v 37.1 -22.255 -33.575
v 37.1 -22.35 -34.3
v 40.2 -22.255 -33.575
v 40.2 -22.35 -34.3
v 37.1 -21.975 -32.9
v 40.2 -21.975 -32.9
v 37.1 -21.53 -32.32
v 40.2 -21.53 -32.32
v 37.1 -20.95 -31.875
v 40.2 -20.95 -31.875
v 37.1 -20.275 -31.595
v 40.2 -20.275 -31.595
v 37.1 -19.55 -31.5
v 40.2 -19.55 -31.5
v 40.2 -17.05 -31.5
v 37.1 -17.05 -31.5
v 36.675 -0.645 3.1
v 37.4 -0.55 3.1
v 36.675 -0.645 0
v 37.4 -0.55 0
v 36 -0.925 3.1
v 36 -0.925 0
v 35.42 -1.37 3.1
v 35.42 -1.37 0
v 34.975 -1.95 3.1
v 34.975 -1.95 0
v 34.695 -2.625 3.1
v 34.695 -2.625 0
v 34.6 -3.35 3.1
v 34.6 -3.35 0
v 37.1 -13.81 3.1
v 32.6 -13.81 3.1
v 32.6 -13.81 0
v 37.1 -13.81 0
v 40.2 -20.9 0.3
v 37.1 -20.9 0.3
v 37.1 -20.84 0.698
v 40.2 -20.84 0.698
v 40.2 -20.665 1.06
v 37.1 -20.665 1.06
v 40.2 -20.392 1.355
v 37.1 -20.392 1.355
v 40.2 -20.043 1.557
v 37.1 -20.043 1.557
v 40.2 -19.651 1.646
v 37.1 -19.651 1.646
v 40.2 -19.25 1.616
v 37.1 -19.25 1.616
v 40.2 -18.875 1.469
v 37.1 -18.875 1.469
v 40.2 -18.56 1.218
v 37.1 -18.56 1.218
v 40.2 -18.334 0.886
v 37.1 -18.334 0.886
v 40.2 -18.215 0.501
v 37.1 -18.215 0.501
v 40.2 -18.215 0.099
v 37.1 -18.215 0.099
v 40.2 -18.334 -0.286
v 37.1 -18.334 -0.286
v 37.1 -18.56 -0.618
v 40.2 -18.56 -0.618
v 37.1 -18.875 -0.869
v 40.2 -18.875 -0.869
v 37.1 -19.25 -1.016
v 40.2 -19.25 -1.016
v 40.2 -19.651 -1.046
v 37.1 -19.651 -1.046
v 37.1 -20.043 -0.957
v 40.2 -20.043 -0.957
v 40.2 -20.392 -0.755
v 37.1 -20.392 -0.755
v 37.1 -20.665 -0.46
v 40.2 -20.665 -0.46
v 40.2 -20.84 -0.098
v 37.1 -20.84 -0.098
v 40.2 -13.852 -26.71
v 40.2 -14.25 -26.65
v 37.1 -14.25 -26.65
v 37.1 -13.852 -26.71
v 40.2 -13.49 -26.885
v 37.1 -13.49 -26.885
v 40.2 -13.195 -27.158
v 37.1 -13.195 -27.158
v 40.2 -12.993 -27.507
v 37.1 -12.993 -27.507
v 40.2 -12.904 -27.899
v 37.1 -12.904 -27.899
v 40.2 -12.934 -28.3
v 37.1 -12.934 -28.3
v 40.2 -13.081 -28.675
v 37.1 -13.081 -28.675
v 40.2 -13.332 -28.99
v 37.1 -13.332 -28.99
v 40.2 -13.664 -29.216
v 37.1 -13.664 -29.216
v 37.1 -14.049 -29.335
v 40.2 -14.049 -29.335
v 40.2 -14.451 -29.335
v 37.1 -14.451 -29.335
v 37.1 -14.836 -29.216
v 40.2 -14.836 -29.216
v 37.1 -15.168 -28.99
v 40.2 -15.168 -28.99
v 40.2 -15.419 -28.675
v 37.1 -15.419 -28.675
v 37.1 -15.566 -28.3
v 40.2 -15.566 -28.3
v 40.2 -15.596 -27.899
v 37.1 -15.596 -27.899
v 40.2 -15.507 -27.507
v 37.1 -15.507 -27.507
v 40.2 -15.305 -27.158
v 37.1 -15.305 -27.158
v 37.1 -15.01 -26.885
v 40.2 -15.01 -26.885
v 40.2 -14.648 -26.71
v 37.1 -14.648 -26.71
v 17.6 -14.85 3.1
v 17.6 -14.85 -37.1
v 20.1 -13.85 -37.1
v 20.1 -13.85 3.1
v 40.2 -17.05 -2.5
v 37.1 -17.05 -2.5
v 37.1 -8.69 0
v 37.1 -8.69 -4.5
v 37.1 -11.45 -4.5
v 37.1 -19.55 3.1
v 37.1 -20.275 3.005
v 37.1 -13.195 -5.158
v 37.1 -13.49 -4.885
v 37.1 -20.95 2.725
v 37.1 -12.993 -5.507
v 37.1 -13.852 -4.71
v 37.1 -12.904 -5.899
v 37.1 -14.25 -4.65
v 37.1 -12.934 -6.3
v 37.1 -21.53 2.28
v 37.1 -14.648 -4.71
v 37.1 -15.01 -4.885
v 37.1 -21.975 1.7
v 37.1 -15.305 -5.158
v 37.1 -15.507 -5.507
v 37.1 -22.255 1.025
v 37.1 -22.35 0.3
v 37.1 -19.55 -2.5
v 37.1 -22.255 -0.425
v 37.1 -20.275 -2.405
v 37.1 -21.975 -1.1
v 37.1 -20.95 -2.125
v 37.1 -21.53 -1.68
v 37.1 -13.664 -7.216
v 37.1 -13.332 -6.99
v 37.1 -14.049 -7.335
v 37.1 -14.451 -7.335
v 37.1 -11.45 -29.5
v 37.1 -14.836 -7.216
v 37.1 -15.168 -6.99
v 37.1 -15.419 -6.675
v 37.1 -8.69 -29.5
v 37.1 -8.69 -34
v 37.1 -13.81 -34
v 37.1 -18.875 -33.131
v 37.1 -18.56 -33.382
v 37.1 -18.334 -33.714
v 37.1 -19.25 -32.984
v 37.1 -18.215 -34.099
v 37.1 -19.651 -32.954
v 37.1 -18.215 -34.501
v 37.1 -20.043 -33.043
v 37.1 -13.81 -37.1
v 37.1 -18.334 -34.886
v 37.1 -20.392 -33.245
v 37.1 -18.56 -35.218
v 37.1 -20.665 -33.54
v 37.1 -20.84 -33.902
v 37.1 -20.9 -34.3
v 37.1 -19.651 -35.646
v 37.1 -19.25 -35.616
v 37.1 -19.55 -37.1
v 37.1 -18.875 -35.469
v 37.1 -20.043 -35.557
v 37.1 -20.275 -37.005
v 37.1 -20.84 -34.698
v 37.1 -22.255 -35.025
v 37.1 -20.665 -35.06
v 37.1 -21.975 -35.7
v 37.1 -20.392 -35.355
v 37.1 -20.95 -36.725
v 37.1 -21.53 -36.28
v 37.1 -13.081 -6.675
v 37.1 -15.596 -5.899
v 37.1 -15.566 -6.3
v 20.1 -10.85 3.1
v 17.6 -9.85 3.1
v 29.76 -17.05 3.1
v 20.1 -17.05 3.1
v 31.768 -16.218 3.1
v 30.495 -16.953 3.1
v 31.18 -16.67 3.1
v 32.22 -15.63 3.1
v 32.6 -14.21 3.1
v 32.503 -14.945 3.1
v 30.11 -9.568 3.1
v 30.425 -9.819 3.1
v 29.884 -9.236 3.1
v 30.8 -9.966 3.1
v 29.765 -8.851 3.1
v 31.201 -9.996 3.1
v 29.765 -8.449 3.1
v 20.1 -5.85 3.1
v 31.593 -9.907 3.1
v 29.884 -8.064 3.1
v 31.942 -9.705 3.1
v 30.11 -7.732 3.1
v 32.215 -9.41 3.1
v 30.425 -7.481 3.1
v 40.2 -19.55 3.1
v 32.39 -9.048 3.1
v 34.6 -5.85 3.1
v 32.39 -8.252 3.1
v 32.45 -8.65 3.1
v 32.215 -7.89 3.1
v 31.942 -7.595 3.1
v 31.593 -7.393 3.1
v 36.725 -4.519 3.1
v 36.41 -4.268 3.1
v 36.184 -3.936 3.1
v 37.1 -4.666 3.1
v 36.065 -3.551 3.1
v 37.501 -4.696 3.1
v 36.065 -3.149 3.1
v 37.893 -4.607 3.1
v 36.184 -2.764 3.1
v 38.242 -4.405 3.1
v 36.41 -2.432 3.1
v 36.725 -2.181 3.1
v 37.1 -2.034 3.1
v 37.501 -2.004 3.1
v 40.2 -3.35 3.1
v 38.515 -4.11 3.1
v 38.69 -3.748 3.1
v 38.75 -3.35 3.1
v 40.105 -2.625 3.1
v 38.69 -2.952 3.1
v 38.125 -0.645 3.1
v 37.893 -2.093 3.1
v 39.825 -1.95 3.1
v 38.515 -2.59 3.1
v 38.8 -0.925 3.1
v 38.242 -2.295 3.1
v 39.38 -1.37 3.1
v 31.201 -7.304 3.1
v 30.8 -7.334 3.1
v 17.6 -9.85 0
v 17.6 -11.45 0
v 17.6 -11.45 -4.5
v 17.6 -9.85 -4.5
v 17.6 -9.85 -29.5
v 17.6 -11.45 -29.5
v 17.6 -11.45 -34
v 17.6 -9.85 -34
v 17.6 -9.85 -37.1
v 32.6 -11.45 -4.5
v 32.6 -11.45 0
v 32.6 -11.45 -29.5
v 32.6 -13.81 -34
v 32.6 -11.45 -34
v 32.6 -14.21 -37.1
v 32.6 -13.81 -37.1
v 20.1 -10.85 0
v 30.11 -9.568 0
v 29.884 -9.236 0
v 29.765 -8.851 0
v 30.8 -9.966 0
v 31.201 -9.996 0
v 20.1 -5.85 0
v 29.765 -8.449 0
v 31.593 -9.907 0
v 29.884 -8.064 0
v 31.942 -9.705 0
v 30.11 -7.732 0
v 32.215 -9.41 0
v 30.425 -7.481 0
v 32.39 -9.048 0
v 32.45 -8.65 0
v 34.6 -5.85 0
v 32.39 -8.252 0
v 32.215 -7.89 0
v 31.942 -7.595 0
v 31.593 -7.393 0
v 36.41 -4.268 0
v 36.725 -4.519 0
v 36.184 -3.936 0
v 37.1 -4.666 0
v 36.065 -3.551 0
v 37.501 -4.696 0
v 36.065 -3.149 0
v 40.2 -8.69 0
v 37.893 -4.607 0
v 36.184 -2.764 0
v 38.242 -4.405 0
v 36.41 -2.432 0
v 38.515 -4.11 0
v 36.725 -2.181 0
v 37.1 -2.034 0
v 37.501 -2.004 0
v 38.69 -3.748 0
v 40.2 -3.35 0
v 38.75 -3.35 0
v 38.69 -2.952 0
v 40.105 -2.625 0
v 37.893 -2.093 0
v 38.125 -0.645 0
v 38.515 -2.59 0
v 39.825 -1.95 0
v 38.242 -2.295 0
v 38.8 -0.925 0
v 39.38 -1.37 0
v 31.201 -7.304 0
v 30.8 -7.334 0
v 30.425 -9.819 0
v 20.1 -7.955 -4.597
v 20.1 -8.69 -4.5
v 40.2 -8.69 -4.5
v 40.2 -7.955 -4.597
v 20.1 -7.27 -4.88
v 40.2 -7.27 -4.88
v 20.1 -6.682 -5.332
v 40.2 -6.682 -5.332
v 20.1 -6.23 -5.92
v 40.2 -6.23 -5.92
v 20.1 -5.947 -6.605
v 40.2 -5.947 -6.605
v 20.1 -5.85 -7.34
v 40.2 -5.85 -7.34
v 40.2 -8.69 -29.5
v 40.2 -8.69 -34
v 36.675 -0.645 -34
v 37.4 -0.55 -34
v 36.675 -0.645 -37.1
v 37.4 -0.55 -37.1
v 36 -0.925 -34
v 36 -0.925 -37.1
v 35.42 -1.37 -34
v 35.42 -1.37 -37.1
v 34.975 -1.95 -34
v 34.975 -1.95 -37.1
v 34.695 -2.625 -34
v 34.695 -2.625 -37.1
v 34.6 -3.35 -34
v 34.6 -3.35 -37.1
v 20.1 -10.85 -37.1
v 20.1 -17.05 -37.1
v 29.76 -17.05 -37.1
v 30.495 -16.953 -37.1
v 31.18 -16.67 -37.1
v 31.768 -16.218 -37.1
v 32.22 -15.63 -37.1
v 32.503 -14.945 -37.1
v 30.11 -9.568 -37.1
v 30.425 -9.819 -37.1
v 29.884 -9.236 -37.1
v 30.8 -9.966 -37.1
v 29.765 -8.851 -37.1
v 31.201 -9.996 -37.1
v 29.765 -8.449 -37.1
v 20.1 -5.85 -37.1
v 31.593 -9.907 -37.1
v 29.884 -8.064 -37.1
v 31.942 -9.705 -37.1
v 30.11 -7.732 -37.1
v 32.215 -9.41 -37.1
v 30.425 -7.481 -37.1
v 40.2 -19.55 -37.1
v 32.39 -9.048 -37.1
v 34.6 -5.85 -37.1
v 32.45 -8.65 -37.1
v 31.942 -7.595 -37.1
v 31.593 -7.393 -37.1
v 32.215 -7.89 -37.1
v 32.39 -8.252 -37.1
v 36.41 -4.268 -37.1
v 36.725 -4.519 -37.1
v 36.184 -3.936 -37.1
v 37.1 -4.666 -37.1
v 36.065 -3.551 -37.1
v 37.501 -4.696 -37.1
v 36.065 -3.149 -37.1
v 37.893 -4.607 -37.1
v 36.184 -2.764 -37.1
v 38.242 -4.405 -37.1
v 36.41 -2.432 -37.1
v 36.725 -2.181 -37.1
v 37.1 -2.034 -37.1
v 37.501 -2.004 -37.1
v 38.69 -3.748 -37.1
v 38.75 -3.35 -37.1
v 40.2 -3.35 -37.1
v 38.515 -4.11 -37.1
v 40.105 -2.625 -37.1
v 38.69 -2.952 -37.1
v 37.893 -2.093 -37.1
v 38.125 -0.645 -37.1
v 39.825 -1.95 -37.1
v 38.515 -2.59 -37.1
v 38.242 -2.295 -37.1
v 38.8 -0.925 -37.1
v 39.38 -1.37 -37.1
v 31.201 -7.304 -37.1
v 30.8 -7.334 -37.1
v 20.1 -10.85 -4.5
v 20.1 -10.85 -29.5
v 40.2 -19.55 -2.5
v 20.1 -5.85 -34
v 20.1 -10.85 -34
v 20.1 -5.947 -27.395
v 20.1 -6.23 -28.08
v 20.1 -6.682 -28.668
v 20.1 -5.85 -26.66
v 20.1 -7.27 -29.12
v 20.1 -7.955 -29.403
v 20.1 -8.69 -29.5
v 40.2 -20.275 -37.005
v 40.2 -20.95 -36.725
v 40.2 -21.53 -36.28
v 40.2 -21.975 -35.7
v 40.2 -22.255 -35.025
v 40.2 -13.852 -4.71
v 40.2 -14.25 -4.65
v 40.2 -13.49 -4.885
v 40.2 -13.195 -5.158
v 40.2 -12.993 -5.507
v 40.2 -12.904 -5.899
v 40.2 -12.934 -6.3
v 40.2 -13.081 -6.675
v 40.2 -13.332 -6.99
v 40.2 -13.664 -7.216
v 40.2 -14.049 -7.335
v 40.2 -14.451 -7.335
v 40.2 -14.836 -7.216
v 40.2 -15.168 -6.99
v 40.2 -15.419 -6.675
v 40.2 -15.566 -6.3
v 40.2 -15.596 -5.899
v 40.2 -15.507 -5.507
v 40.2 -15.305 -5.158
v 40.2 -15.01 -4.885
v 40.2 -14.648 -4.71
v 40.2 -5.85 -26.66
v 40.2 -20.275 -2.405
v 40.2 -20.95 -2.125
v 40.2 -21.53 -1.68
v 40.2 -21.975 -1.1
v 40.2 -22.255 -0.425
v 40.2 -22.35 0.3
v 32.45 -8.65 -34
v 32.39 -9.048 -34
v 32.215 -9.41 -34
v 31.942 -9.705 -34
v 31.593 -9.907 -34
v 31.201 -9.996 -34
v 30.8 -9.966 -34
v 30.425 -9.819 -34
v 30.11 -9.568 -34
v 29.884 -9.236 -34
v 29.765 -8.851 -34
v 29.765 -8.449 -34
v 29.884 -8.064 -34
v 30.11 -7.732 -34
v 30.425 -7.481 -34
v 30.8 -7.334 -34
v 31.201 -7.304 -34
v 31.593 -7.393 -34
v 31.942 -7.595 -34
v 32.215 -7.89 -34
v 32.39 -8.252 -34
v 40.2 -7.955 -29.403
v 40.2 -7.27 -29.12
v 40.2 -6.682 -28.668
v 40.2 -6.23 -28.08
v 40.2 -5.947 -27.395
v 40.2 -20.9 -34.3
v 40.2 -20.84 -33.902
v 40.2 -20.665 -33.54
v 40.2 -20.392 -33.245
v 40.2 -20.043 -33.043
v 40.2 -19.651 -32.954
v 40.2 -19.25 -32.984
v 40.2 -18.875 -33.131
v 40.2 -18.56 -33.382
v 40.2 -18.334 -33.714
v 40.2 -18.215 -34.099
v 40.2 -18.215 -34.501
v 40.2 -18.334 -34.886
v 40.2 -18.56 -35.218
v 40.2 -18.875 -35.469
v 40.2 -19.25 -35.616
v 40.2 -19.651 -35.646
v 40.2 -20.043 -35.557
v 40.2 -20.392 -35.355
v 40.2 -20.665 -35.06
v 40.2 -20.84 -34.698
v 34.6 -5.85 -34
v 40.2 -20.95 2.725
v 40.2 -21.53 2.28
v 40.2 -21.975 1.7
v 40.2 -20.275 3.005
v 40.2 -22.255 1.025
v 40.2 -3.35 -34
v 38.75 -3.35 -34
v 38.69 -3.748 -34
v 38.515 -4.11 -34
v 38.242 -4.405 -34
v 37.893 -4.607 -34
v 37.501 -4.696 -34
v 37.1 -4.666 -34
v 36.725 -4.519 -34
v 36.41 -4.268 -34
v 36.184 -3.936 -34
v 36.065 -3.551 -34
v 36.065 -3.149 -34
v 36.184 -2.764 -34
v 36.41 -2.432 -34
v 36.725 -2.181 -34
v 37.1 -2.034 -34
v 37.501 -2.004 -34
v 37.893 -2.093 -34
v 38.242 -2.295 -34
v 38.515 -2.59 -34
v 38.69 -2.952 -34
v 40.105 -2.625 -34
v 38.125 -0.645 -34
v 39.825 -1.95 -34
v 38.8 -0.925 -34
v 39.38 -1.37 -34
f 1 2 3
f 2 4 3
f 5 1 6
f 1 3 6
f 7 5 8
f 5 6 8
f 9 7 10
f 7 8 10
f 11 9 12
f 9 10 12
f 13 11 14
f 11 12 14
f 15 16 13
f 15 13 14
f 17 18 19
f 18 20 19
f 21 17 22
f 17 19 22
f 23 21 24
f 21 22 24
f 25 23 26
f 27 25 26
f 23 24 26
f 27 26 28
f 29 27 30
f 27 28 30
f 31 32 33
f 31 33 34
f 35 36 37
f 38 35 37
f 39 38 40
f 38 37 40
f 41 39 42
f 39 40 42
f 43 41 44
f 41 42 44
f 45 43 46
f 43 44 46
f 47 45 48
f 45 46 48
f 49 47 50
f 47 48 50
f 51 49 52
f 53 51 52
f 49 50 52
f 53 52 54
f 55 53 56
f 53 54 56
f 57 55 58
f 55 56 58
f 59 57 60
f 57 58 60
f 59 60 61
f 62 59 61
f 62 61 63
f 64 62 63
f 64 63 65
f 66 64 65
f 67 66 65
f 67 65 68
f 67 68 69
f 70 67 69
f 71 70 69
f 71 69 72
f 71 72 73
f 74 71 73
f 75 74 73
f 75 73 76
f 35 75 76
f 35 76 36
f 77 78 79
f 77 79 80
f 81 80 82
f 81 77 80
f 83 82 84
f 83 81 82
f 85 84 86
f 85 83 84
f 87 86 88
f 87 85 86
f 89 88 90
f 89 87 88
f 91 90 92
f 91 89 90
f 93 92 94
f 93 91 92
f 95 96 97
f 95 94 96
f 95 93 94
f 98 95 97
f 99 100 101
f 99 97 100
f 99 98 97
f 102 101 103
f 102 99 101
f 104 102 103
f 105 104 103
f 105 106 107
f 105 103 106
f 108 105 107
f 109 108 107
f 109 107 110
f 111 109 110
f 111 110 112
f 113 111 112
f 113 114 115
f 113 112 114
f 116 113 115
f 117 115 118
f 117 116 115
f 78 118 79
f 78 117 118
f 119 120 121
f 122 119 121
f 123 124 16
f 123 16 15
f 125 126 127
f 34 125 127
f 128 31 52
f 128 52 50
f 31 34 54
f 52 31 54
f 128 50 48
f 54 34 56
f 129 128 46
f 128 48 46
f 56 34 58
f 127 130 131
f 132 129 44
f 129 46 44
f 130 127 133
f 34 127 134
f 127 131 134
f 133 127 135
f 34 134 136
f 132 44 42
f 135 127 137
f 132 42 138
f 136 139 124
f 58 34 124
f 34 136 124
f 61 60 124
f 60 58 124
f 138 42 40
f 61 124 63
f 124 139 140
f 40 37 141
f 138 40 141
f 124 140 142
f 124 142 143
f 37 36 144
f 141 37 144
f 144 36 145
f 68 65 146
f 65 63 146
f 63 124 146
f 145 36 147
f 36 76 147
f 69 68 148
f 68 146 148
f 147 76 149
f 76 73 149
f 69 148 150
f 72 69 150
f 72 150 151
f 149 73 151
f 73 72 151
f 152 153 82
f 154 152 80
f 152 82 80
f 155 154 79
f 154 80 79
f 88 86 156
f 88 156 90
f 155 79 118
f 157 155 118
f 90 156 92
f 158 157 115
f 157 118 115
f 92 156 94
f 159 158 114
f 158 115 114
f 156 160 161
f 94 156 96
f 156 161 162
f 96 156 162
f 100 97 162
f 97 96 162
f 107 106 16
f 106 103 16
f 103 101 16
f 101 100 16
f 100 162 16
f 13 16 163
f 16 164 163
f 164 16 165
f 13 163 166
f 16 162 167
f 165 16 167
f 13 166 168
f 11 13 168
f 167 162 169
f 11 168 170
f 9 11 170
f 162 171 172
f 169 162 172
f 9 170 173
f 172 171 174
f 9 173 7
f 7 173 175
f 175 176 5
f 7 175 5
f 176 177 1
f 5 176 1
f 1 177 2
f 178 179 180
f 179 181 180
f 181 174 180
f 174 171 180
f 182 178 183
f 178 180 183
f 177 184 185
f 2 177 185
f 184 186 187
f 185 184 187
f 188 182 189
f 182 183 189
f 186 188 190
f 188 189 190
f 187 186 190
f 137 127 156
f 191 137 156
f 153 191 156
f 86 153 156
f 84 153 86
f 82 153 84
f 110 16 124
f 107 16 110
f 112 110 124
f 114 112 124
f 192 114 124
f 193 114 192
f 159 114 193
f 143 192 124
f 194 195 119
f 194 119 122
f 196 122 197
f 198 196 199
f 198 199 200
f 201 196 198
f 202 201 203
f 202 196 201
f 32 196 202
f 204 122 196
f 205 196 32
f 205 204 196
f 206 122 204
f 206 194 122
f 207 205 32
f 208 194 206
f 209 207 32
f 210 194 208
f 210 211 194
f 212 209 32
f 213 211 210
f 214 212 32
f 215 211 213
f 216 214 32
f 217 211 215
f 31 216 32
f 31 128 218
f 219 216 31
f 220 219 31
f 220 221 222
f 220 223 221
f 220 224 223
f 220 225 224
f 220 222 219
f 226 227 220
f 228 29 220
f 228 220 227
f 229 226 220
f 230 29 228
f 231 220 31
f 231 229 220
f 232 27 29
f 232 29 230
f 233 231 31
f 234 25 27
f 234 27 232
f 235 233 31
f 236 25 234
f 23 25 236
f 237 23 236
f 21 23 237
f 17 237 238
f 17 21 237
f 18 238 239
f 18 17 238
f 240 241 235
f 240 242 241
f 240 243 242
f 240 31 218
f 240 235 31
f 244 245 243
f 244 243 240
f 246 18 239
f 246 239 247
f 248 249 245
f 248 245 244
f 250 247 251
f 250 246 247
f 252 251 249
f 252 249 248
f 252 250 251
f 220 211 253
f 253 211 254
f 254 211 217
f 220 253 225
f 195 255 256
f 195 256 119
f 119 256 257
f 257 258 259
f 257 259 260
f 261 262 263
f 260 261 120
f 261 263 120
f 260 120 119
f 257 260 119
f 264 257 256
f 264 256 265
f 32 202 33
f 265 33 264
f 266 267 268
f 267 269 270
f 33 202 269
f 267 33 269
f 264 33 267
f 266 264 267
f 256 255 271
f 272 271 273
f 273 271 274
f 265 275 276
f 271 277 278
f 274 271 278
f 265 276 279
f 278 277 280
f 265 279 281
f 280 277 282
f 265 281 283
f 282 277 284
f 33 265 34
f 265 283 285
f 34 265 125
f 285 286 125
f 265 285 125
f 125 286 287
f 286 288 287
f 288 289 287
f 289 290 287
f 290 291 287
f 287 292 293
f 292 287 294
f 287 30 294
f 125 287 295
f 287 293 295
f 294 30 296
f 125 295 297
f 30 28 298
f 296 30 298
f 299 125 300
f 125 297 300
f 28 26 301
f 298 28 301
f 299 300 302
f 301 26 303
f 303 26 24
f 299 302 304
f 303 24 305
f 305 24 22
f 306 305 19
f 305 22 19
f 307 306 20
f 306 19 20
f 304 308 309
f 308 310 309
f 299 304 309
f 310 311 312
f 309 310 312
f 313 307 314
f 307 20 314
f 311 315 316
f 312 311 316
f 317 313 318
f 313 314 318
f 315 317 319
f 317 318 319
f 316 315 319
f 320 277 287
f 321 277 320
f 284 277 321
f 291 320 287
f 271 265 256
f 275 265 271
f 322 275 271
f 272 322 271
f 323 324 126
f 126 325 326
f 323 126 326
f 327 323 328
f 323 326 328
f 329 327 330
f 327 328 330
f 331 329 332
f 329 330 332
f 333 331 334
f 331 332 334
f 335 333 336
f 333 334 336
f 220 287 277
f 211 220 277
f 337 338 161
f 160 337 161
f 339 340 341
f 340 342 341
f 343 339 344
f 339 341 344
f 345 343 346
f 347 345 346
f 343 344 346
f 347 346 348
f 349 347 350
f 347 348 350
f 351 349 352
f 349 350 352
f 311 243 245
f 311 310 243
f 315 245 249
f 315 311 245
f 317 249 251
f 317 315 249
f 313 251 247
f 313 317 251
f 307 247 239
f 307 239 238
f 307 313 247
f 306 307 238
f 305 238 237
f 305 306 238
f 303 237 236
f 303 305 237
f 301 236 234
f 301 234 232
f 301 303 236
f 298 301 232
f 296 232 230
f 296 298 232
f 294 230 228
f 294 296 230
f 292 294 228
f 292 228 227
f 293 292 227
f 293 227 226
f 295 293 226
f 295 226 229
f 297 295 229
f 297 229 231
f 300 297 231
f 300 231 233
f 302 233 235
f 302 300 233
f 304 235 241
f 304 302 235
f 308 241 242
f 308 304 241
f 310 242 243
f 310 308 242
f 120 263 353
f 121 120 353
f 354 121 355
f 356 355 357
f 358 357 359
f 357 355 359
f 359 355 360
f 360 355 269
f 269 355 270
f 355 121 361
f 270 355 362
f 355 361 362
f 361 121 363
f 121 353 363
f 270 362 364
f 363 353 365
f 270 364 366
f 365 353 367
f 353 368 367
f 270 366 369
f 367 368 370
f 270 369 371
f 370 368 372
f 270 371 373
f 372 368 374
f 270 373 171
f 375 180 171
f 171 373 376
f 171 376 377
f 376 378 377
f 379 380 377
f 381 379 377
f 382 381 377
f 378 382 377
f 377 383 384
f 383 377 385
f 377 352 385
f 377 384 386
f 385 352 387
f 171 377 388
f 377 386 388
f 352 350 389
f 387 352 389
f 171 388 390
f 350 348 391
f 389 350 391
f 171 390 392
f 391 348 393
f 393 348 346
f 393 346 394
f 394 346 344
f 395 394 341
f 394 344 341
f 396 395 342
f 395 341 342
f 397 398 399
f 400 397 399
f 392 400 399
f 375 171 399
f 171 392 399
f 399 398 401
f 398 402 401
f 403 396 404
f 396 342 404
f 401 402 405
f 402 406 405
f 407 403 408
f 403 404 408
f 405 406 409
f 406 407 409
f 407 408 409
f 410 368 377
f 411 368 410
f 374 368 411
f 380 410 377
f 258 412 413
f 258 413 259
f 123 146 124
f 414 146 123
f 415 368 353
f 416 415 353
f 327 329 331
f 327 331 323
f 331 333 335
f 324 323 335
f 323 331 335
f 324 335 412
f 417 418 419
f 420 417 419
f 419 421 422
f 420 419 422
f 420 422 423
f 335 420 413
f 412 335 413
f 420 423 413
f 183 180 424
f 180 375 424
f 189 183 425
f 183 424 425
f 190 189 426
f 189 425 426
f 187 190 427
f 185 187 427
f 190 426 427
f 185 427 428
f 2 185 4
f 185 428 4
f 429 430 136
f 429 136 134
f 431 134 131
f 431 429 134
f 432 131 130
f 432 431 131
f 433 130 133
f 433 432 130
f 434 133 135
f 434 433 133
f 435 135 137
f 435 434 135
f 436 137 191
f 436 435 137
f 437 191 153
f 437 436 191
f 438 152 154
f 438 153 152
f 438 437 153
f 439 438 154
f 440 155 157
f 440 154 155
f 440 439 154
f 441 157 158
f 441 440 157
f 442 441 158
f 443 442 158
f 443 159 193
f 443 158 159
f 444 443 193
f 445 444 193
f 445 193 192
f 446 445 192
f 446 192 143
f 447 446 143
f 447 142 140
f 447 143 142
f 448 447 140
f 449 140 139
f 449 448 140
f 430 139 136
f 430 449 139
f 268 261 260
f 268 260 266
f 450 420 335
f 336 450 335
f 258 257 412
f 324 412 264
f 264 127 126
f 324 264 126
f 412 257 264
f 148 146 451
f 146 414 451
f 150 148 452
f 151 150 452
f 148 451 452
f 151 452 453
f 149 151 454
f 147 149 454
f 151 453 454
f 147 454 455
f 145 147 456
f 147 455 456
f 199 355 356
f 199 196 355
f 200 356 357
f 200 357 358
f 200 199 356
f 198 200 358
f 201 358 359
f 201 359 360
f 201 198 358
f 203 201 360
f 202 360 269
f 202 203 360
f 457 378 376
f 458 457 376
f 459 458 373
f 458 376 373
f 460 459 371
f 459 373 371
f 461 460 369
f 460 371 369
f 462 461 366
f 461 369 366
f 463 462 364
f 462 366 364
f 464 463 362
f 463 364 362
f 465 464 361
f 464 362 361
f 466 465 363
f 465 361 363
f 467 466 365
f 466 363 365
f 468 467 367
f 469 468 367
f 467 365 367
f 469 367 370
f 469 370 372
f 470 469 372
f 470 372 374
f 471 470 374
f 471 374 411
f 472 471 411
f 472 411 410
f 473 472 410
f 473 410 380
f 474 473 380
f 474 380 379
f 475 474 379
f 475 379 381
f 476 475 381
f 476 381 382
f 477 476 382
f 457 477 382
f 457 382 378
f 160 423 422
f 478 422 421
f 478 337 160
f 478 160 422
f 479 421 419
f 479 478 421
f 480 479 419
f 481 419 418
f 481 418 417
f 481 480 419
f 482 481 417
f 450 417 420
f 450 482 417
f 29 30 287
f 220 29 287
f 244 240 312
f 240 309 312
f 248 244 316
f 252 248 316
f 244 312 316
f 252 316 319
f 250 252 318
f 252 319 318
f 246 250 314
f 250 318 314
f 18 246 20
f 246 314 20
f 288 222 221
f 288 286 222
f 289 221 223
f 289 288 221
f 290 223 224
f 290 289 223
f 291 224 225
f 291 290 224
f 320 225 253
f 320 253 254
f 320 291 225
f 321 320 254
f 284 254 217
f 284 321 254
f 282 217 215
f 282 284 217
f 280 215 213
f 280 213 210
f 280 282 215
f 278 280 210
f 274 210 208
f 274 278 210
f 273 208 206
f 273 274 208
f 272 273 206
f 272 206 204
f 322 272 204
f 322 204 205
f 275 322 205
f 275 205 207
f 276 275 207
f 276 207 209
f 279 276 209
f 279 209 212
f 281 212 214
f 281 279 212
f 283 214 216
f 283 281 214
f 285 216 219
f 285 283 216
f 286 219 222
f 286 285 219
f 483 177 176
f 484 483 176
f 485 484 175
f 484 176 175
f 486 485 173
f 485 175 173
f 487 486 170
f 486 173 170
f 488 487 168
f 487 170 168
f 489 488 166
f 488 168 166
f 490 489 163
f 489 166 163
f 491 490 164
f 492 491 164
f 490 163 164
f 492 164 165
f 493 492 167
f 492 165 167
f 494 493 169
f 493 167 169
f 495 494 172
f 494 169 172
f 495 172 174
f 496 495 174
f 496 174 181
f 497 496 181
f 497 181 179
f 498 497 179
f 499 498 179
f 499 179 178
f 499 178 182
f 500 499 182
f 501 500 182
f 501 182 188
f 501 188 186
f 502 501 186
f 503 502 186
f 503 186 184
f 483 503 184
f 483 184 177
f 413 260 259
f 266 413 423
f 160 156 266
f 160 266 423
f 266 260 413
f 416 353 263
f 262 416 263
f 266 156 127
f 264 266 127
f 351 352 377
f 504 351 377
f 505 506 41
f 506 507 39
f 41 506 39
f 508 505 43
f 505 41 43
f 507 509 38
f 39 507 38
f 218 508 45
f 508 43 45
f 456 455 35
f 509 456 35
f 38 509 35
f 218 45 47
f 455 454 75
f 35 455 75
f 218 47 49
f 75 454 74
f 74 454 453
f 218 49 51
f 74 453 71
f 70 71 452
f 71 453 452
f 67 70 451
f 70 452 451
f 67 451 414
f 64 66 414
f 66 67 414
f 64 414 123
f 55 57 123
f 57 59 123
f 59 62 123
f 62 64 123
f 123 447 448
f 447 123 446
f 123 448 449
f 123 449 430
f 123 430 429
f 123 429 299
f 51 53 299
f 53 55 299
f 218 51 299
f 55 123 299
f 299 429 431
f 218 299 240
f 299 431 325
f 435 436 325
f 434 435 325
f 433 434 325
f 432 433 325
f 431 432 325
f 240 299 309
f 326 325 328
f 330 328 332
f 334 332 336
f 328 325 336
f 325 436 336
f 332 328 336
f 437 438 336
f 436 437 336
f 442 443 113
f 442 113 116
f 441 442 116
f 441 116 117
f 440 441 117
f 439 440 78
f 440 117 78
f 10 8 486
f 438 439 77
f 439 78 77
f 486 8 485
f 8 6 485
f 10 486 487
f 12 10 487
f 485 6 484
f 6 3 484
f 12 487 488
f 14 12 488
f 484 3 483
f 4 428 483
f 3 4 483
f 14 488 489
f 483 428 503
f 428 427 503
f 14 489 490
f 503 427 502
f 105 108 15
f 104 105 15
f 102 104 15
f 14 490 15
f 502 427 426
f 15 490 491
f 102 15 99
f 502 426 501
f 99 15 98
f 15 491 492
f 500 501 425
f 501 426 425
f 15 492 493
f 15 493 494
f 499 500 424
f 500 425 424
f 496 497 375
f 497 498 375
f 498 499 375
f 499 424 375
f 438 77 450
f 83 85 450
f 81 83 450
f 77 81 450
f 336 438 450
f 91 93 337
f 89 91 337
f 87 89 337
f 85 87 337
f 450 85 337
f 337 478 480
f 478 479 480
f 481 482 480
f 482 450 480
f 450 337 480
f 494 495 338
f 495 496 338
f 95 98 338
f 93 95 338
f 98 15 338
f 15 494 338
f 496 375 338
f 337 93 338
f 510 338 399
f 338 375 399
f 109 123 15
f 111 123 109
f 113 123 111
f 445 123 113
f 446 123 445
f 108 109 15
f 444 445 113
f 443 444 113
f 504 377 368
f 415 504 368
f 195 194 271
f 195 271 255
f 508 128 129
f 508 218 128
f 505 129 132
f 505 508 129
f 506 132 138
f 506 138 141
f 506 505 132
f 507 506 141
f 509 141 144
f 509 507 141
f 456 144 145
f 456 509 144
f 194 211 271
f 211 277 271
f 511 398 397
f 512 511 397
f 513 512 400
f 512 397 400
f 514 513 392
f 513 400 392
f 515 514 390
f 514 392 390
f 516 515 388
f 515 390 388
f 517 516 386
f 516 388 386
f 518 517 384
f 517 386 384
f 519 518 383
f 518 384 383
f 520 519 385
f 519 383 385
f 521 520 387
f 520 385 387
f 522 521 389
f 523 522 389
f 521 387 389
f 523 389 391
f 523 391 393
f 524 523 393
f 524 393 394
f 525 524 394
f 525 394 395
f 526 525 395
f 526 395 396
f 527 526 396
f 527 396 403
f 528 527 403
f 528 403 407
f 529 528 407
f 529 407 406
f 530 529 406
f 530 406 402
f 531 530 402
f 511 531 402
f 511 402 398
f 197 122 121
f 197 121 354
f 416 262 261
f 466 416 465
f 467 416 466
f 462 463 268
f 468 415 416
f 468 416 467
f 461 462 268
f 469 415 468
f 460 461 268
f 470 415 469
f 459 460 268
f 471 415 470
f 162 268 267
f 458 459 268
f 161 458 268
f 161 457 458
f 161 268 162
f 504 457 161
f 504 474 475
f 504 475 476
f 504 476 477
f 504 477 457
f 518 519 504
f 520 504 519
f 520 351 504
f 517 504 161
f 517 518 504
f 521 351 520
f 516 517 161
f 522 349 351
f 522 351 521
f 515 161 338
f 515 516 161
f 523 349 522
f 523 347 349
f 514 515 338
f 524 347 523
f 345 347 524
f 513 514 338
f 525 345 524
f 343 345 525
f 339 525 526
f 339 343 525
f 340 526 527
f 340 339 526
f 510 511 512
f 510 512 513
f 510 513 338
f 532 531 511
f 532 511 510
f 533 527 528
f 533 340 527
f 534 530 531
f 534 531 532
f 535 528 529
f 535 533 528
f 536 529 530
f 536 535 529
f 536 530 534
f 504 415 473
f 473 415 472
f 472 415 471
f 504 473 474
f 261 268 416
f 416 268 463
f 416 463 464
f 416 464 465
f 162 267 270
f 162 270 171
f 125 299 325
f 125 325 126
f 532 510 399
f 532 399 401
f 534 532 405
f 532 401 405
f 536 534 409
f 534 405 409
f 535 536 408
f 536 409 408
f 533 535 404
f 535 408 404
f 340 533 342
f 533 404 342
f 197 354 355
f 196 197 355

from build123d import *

# Parameters (mm, degrees)
ESBO_O1_R                  = 1.35
RESSALTO_EXTRUS_O1_DEPTH   = 2
ESBO_O3_W                  = 40.2
ESBO_O3_H                  = 2
RESSALTO_EXTRUS_O2_DEPTH   = 10.08
ESBO_O4_W                  = 3.1
ESBO_O4_H                  = 12.84
RESSALTO_EXTRUS_O3_DEPTH   = 34
CORTE_EXTRUS_O1_DEPTH      = 55.735280213
CORTE_EXTRUS_O1_DEPTH_BACK = 55.735280213
ESBO_O5_R                  = 1.35
ESBO_O7_W                  = 37.1
ESBO_O7_H                  = 3.24
CORTE_EXTRUS_O2_DEPTH      = 2
RESSALTO_EXTRUS_O5_START   = 2
ESBO_O12_R                 = 1.35
RESSALTO_EXTRUS_O5_DEPTH   = 2
ESBO_O18_W                 = 3.1
ESBO_O18_H                 = 3.24
RESSALTO_EXTRUS_O6_DEPTH   = 2
ESBO_O19_W                 = 3.1
ESBO_O19_H                 = 3.24
RESSALTO_EXTRUS_O7_DEPTH   = 2
ESBO_O21_R                 = 1.301764144
ESBO_O21_R_2               = 1.35
RESSALTO_EXTRUS_O8_DEPTH   = 1.1
RESSALTO_EXTRUS_O9_START   = 1.1
ESBO_O22_R                 = 1.35
RESSALTO_EXTRUS_O9_DEPTH   = 1.1
ESBO_O23_W                 = 3.1
ESBO_O23_H                 = 5.6
RESSALTO_EXTRUS_O10_DEPTH  = 5.85
CORTE_EXTRUS_O3_REACH      = 63.173
ESBO_O24_R                 = 1.35
ESBO_O25_W                 = 4.5
ESBO_O25_H                 = 3.1
CORTE_EXTRUS_O6_DEPTH      = 4.48
ESBO_O27_W                 = 3.1
ESBO_O27_H                 = 29
CORTE_EXTRUS_O7_DEPTH      = 4.48
ESBO_O28_W                 = 25
ESBO_O28_H                 = 40.2
CORTE_EXTRUS_O8_DEPTH      = 1.24
ESBO_O29_W                 = 25
ESBO_O29_H                 = 5.6
RESSALTO_EXTRUS_O11_DEPTH  = 34
ESBO_O31_W                 = 3.1
ESBO_O31_H                 = 25
RESSALTO_EXTRUS_O12_DEPTH  = 2.84
ESBO_O32_W                 = 25
ESBO_O32_H                 = 5.6
RESSALTO_EXTRUS_O13_DEPTH  = 34
FILETE1_R                  = 2.84
ESBO_O33_W                 = 5.6
ESBO_O33_H                 = 3.1
CORTE_EXTRUS_O9_DEPTH      = 0.55
ESBO_O35_W                 = 3.1
ESBO_O35_H                 = 5.6
CORTE_EXTRUS_O10_DEPTH     = 5.03
FILETE2_R                  = 2.8
DIVIDIR1_SURFACE_1_BACK    = 61.888
DIVIDIR1_SURFACE_1_DEPTH   = 123.776
DIVIDIR1_SURFACE_2_BACK    = 61.888
DIVIDIR1_SURFACE_2_DEPTH   = 123.776


# Read off the part's stored shape, not the designer's step: Corpo-Excluir/Manter 1
with BuildPart() as part:
    # Esboço1 → Ressalto-extrusão1 (new body)
    with BuildSketch(Plane.XY):
        Polygon((0, 0), (5.6, 0), (5.6, -5.85), (34.6, -5.85), (34.6, 0), (40.2, 0), (40.2, -11.45), (0, -11.45), align=None)
        with Locations((2.8, -3.35)):
            Circle(ESBO_O1_R, mode=Mode.SUBTRACT)
        with Locations((37.4, -3.35)):
            Circle(ESBO_O1_R, mode=Mode.SUBTRACT)
        with Locations((31.1, -8.65)):
            Circle(ESBO_O1_R, mode=Mode.SUBTRACT)
        with Locations((9.1, -8.65)):
            Circle(ESBO_O1_R, mode=Mode.SUBTRACT)
    extrude(amount=RESSALTO_EXTRUS_O1_DEPTH)

    # Esboço3 → Ressalto-extrusão2 (add)
    with BuildSketch(Plane.XZ.offset(11.45)):
        with Locations((20.1, 1)):
            Rectangle(ESBO_O3_W, ESBO_O3_H)
    extrude(amount=RESSALTO_EXTRUS_O2_DEPTH)

    # Esboço4 → Ressalto-extrusão3 (add)
    with BuildSketch(Plane(origin=(0, 0, 0), x_dir=(-1, 0, 0), z_dir=(0, 0, -1))):
        with Locations((-38.65, -15.11)):
            Rectangle(ESBO_O4_W, ESBO_O4_H)
        with Locations((-1.55, -15.11)):
            Rectangle(ESBO_O4_W, ESBO_O4_H)
    extrude(amount=RESSALTO_EXTRUS_O3_DEPTH)

    # Esboço5 → Corte-extrusão1 (cut, two sides: drawn at the far end of the back side and taken through both)
    with BuildSketch(Plane.ZY.offset(-37.1).offset(-CORTE_EXTRUS_O1_DEPTH_BACK)):
        with Locations((-6, -14.25)):
            Circle(ESBO_O5_R)
        with Locations((-28, -14.25)):
            Circle(ESBO_O5_R)
    extrude(amount=CORTE_EXTRUS_O1_DEPTH + CORTE_EXTRUS_O1_DEPTH_BACK, mode=Mode.SUBTRACT)

    # Esboço7 → Corte-extrusão2 (cut)
    with BuildSketch(Plane(origin=(0, 0, 0), x_dir=(-1, 0, 0), z_dir=(0, 0, -1))):
        with Locations((-18.55, -19.91)):
            Rectangle(ESBO_O7_W, ESBO_O7_H)
    extrude(amount=-CORTE_EXTRUS_O2_DEPTH, mode=Mode.SUBTRACT)

    # Esboço12 → Ressalto-extrusão5 (add)
    with BuildSketch(Plane(origin=(0, 0, -34), x_dir=(-1, 0, 0), z_dir=(0, 0, -1)).offset(RESSALTO_EXTRUS_O5_START)):
        Polygon((-5.6, 0), (0, 0), (0, -18.29), (-40.2, -18.29), (-40.2, 0), (-34.6, 0), (-34.6, -5.85), (-5.6, -5.85), align=None)
        with Locations(Location((-31.1, -8.65, 0), (0, 0, 180))):
            Circle(ESBO_O12_R, mode=Mode.SUBTRACT)
        with Locations(Location((-9.1, -8.65, 0), (0, 0, 180))):
            Circle(ESBO_O12_R, mode=Mode.SUBTRACT)
        with Locations(Location((-2.8, -3.35, 0), (0, 0, 180))):
            Circle(ESBO_O12_R, mode=Mode.SUBTRACT)
        with Locations(Location((-37.4, -3.35, 0), (0, 0, 180))):
            Circle(ESBO_O12_R, mode=Mode.SUBTRACT)
    extrude(amount=-RESSALTO_EXTRUS_O5_DEPTH)

    # Esboço18 → Ressalto-extrusão6 (add)
    with BuildSketch(Plane.XY):
        with Locations((1.55, -19.91)):
            Rectangle(ESBO_O18_W, ESBO_O18_H)
    extrude(amount=RESSALTO_EXTRUS_O6_DEPTH)

    # Esboço19 → Ressalto-extrusão7 (add)
    with BuildSketch(Plane(origin=(0, 0, -34), x_dir=(-1, 0, 0), z_dir=(0, 0, -1))):
        with Locations((-1.55, -19.91)):
            Rectangle(ESBO_O19_W, ESBO_O19_H)
        with Locations((-38.65, -19.91)):
            Rectangle(ESBO_O19_W, ESBO_O19_H)
    extrude(amount=RESSALTO_EXTRUS_O7_DEPTH)

    # Esboço21 → Ressalto-extrusão8 (add)
    with BuildSketch(Plane.XY.offset(2)):
        Polygon((37.1, -21.53), (40.2, -21.53), (40.2, 0), (34.6, 0), (34.6, -5.85), (5.6, -5.85), (5.6, 0), (0, 0), (0, -21.53), (3.1, -21.53), (3.1, -18.29), (37.1, -18.29), align=None)
        with Locations((2.8, -3.35)):
            Circle(ESBO_O21_R, mode=Mode.SUBTRACT)
        with Locations((9.1, -8.65)):
            Circle(ESBO_O21_R_2, mode=Mode.SUBTRACT)
        with Locations((31.1, -8.65)):
            Circle(ESBO_O21_R_2, mode=Mode.SUBTRACT)
        with Locations((37.4, -3.35)):
            Circle(ESBO_O21_R_2, mode=Mode.SUBTRACT)
    extrude(amount=RESSALTO_EXTRUS_O8_DEPTH)

    # Esboço22 → Ressalto-extrusão9 (add)
    with BuildSketch(Plane(origin=(0, 0, -36), x_dir=(-1, 0, 0), z_dir=(0, 0, -1)).offset(RESSALTO_EXTRUS_O9_START)):
        Polygon((-5.6, 0), (0, 0), (0, -21.53), (-3.1, -21.53), (-3.1, -18.29), (-37.1, -18.29), (-37.1, -21.53), (-40.2, -21.53), (-40.2, 0), (-34.6, 0), (-34.6, -5.85), (-5.6, -5.85), align=None)
        with Locations(Location((-37.4, -3.35, 0), (0, 0, 180))):
            Circle(ESBO_O22_R, mode=Mode.SUBTRACT)
        with Locations(Location((-31.1, -8.65, 0), (0, 0, 180))):
            Circle(ESBO_O22_R, mode=Mode.SUBTRACT)
        with Locations(Location((-9.1, -8.65, 0), (0, 0, 180))):
            Circle(ESBO_O22_R, mode=Mode.SUBTRACT)
        with Locations(Location((-2.8, -3.35, 0), (0, 0, 180))):
            Circle(ESBO_O22_R, mode=Mode.SUBTRACT)
    extrude(amount=-RESSALTO_EXTRUS_O9_DEPTH)

    # Esboço23 → Ressalto-extrusão10 (add)
    with BuildSketch(Plane.XZ.offset(21.53)):
        with Locations((1.55, 0.3)):
            Rectangle(ESBO_O23_W, ESBO_O23_H)
        with Locations((1.55, -34.3)):
            Rectangle(ESBO_O23_W, ESBO_O23_H)
        with Locations((38.65, -34.3)):
            Rectangle(ESBO_O23_W, ESBO_O23_H)
        with Locations((38.65, 0.3)):
            Rectangle(ESBO_O23_W, ESBO_O23_H)
    extrude(amount=RESSALTO_EXTRUS_O10_DEPTH)

    # Corte-extrusão3: up to this face of the body (flat: up to its plane)
    corte_extrus_o3_end = Plane(part.part.faces().sort_by_distance((40.2, -15.177512698, -17))[0])
    # Esboço24 → Corte-extrusão3 (cut, up to the picked face)
    with BuildSketch(Plane.ZY, mode=Mode.PRIVATE) as corte_extrus_o3_sk1:
        with Locations(Location((-34.3, -19.55, 0), (0, 0, 270))):
            Circle(ESBO_O24_R)
    corte_extrus_o3_tool1 = split(extrude(corte_extrus_o3_sk1.sketch, amount=-CORTE_EXTRUS_O3_REACH, mode=Mode.PRIVATE), bisect_by=corte_extrus_o3_end, keep=Keep.BOTH, mode=Mode.PRIVATE)
    # Esboço24 → Corte-extrusão3 (cut, up to the picked face)
    with BuildSketch(Plane.ZY, mode=Mode.PRIVATE) as corte_extrus_o3_sk2:
        with Locations(Location((0.3, -19.55, 0), (0, 0, 270))):
            Circle(ESBO_O24_R)
    corte_extrus_o3_tool2 = split(extrude(corte_extrus_o3_sk2.sketch, amount=-CORTE_EXTRUS_O3_REACH, mode=Mode.PRIVATE), bisect_by=corte_extrus_o3_end, keep=Keep.BOTH, mode=Mode.PRIVATE)
    add(corte_extrus_o3_tool1.solids().sort_by(Axis((0, -19.55, -34.3), (1, 0, 0)))[0], mode=Mode.SUBTRACT)
    add(corte_extrus_o3_tool2.solids().sort_by(Axis((0, -19.55, 0.3), (1, 0, 0)))[0], mode=Mode.SUBTRACT)

    # Esboço25 → Corte-extrusão6 (cut)
    with BuildSketch(Plane.XZ.offset(18.29)):
        with Locations((5.35, -35.55)):
            Rectangle(ESBO_O25_W, ESBO_O25_H)
        with Locations((34.85, -35.55)):
            Rectangle(ESBO_O25_W, ESBO_O25_H)
        with Locations((34.85, 1.55)):
            Rectangle(ESBO_O25_W, ESBO_O25_H)
        with Locations((5.35, 1.55)):
            Rectangle(ESBO_O25_W, ESBO_O25_H)
    extrude(amount=-CORTE_EXTRUS_O6_DEPTH, mode=Mode.SUBTRACT)

    # Esboço27 → Corte-extrusão7 (cut)
    with BuildSketch(Plane.XZ.offset(21.53)):
        with Locations((1.55, -17)):
            Rectangle(ESBO_O27_W, ESBO_O27_H)
        with Locations((38.65, -17)):
            Rectangle(ESBO_O27_W, ESBO_O27_H)
    extrude(amount=-CORTE_EXTRUS_O7_DEPTH, mode=Mode.SUBTRACT)

    # Esboço28 → Corte-extrusão8 (cut)
    with BuildSketch(Plane.XZ.offset(18.29)):
        with Locations((20.1, -17)):
            Rectangle(ESBO_O28_W, ESBO_O28_H)
    extrude(amount=-CORTE_EXTRUS_O8_DEPTH, mode=Mode.SUBTRACT)

    # Esboço29 → Ressalto-extrusão11 (add)
    with BuildSketch(Plane.XY.offset(-34)):
        with Locations((20.1, -14.25)):
            Rectangle(ESBO_O29_W, ESBO_O29_H)
    extrude(amount=RESSALTO_EXTRUS_O11_DEPTH)

    # Esboço31 → Ressalto-extrusão12 (add)
    with BuildSketch(Plane(origin=(0, -8.69, 0), x_dir=(1, 0, 0), z_dir=(0, 1, 0))):
        with Locations((1.55, 17)):
            Rectangle(ESBO_O31_W, ESBO_O31_H)
        with Locations((38.65, 17)):
            Rectangle(ESBO_O31_W, ESBO_O31_H)
    extrude(amount=RESSALTO_EXTRUS_O12_DEPTH)

    # Esboço32 → Ressalto-extrusão13 (add)
    with BuildSketch(Plane.ZY.offset(-37.1)):
        with Locations((-17, -8.65)):
            Rectangle(ESBO_O32_W, ESBO_O32_H)
    extrude(amount=RESSALTO_EXTRUS_O13_DEPTH)

    # Filete1
    filete1_edges = [part.edges().sort_by_distance(p)[0] for p in [
        (32.6, -17.05, -17),
        (7.6, -17.05, -17),
        (20.1, -5.85, -29.5),
        (20.1, -5.85, -4.5),
    ]]
    fillet(filete1_edges, radius=FILETE1_R)

    # Esboço33 → Corte-extrusão9 (cut)
    with BuildSketch(Plane(origin=(0, 0, 0), x_dir=(1, 0, 0), z_dir=(0, 1, 0))):
        with Locations((2.8, 35.55)):
            Rectangle(ESBO_O33_W, ESBO_O33_H)
        with Locations((37.4, 35.55)):
            Rectangle(ESBO_O33_W, ESBO_O33_H)
        with Locations((37.4, -1.55)):
            Rectangle(ESBO_O33_W, ESBO_O33_H)
        with Locations((2.8, -1.55)):
            Rectangle(ESBO_O33_W, ESBO_O33_H)
    extrude(amount=-CORTE_EXTRUS_O9_DEPTH, mode=Mode.SUBTRACT)

    # Esboço35 → Corte-extrusão10 (cut)
    with BuildSketch(Plane.XZ.offset(27.38)):
        with Locations((1.55, 0.3)):
            Rectangle(ESBO_O35_W, ESBO_O35_H)
        with Locations((38.65, 0.3)):
            Rectangle(ESBO_O35_W, ESBO_O35_H)
        with Locations((38.65, -34.3)):
            Rectangle(ESBO_O35_W, ESBO_O35_H)
        with Locations((1.55, -34.3)):
            Rectangle(ESBO_O35_W, ESBO_O35_H)
    extrude(amount=-CORTE_EXTRUS_O10_DEPTH, mode=Mode.SUBTRACT)

    # Filete2
    filete2_edges = [part.edges().sort_by_distance(p)[0] for p in [
        (34.6, -0.55, 1.55),
        (40.2, -0.55, 1.55),
        (0, -0.55, 1.55),
        (5.6, -0.55, 1.55),
        (40.2, -0.55, -35.55),
        (34.6, -0.55, -35.55),
        (5.6, -0.55, -35.55),
        (0, -0.55, -35.55),
        (1.55, -22.35, -31.5),
        (1.55, -22.35, -37.1),
        (38.65, -22.35, -31.5),
        (38.65, -22.35, -37.1),
        (38.65, -22.35, 3.1),
        (38.65, -22.35, -2.5),
        (1.55, -22.35, -2.5),
        (1.55, -22.35, 3.1),
    ]]
    fillet(filete2_edges, radius=FILETE2_R - 0.0001)  # a hair under: the kernel refuses the full size


with BuildPart() as body_2:
    # Dividir1: the piece behind the surface
    add(part.part)
    # Dividir1 surface: a surface, the sketch's curves swept straight by 123.776 mm
    with BuildLine(Plane.XY.offset(3.1).offset(-DIVIDIR1_SURFACE_1_BACK), mode=Mode.PRIVATE) as dividir1_surface_1_path:
        Line((20.1, -0.55), (20.1, -10.85))
        Line((20.1, -10.85), (17.6, -9.85))
        Line((17.6, -9.85), (17.6, -14.85))
        Line((17.6, -14.85), (20.1, -13.85))
        Line((20.1, -13.85), (20.1, -22.35))
    dividir1_surface_1 = Shell.extrude(dividir1_surface_1_path.wire(), (0 * DIVIDIR1_SURFACE_1_DEPTH, 0 * DIVIDIR1_SURFACE_1_DEPTH, 1 * DIVIDIR1_SURFACE_1_DEPTH))
    split(bisect_by=dividir1_surface_1, keep=Keep.BOTTOM)


with BuildPart() as part_1:
    add(part.part)

    # Dividir1: split by a surface, the side it looks to stays
    # Dividir1 surface: a surface, the sketch's curves swept straight by 123.776 mm
    with BuildLine(Plane.XY.offset(3.1).offset(-DIVIDIR1_SURFACE_2_BACK), mode=Mode.PRIVATE) as dividir1_surface_2_path:
        Line((20.1, -0.55), (20.1, -10.85))
        Line((20.1, -10.85), (17.6, -9.85))
        Line((17.6, -9.85), (17.6, -14.85))
        Line((17.6, -14.85), (20.1, -13.85))
        Line((20.1, -13.85), (20.1, -22.35))
    dividir1_surface_2 = Shell.extrude(dividir1_surface_2_path.wire(), (0 * DIVIDIR1_SURFACE_2_DEPTH, 0 * DIVIDIR1_SURFACE_2_DEPTH, 1 * DIVIDIR1_SURFACE_2_DEPTH))
    split(bisect_by=dividir1_surface_2, keep=Keep.TOP)


solid = part_1.part
